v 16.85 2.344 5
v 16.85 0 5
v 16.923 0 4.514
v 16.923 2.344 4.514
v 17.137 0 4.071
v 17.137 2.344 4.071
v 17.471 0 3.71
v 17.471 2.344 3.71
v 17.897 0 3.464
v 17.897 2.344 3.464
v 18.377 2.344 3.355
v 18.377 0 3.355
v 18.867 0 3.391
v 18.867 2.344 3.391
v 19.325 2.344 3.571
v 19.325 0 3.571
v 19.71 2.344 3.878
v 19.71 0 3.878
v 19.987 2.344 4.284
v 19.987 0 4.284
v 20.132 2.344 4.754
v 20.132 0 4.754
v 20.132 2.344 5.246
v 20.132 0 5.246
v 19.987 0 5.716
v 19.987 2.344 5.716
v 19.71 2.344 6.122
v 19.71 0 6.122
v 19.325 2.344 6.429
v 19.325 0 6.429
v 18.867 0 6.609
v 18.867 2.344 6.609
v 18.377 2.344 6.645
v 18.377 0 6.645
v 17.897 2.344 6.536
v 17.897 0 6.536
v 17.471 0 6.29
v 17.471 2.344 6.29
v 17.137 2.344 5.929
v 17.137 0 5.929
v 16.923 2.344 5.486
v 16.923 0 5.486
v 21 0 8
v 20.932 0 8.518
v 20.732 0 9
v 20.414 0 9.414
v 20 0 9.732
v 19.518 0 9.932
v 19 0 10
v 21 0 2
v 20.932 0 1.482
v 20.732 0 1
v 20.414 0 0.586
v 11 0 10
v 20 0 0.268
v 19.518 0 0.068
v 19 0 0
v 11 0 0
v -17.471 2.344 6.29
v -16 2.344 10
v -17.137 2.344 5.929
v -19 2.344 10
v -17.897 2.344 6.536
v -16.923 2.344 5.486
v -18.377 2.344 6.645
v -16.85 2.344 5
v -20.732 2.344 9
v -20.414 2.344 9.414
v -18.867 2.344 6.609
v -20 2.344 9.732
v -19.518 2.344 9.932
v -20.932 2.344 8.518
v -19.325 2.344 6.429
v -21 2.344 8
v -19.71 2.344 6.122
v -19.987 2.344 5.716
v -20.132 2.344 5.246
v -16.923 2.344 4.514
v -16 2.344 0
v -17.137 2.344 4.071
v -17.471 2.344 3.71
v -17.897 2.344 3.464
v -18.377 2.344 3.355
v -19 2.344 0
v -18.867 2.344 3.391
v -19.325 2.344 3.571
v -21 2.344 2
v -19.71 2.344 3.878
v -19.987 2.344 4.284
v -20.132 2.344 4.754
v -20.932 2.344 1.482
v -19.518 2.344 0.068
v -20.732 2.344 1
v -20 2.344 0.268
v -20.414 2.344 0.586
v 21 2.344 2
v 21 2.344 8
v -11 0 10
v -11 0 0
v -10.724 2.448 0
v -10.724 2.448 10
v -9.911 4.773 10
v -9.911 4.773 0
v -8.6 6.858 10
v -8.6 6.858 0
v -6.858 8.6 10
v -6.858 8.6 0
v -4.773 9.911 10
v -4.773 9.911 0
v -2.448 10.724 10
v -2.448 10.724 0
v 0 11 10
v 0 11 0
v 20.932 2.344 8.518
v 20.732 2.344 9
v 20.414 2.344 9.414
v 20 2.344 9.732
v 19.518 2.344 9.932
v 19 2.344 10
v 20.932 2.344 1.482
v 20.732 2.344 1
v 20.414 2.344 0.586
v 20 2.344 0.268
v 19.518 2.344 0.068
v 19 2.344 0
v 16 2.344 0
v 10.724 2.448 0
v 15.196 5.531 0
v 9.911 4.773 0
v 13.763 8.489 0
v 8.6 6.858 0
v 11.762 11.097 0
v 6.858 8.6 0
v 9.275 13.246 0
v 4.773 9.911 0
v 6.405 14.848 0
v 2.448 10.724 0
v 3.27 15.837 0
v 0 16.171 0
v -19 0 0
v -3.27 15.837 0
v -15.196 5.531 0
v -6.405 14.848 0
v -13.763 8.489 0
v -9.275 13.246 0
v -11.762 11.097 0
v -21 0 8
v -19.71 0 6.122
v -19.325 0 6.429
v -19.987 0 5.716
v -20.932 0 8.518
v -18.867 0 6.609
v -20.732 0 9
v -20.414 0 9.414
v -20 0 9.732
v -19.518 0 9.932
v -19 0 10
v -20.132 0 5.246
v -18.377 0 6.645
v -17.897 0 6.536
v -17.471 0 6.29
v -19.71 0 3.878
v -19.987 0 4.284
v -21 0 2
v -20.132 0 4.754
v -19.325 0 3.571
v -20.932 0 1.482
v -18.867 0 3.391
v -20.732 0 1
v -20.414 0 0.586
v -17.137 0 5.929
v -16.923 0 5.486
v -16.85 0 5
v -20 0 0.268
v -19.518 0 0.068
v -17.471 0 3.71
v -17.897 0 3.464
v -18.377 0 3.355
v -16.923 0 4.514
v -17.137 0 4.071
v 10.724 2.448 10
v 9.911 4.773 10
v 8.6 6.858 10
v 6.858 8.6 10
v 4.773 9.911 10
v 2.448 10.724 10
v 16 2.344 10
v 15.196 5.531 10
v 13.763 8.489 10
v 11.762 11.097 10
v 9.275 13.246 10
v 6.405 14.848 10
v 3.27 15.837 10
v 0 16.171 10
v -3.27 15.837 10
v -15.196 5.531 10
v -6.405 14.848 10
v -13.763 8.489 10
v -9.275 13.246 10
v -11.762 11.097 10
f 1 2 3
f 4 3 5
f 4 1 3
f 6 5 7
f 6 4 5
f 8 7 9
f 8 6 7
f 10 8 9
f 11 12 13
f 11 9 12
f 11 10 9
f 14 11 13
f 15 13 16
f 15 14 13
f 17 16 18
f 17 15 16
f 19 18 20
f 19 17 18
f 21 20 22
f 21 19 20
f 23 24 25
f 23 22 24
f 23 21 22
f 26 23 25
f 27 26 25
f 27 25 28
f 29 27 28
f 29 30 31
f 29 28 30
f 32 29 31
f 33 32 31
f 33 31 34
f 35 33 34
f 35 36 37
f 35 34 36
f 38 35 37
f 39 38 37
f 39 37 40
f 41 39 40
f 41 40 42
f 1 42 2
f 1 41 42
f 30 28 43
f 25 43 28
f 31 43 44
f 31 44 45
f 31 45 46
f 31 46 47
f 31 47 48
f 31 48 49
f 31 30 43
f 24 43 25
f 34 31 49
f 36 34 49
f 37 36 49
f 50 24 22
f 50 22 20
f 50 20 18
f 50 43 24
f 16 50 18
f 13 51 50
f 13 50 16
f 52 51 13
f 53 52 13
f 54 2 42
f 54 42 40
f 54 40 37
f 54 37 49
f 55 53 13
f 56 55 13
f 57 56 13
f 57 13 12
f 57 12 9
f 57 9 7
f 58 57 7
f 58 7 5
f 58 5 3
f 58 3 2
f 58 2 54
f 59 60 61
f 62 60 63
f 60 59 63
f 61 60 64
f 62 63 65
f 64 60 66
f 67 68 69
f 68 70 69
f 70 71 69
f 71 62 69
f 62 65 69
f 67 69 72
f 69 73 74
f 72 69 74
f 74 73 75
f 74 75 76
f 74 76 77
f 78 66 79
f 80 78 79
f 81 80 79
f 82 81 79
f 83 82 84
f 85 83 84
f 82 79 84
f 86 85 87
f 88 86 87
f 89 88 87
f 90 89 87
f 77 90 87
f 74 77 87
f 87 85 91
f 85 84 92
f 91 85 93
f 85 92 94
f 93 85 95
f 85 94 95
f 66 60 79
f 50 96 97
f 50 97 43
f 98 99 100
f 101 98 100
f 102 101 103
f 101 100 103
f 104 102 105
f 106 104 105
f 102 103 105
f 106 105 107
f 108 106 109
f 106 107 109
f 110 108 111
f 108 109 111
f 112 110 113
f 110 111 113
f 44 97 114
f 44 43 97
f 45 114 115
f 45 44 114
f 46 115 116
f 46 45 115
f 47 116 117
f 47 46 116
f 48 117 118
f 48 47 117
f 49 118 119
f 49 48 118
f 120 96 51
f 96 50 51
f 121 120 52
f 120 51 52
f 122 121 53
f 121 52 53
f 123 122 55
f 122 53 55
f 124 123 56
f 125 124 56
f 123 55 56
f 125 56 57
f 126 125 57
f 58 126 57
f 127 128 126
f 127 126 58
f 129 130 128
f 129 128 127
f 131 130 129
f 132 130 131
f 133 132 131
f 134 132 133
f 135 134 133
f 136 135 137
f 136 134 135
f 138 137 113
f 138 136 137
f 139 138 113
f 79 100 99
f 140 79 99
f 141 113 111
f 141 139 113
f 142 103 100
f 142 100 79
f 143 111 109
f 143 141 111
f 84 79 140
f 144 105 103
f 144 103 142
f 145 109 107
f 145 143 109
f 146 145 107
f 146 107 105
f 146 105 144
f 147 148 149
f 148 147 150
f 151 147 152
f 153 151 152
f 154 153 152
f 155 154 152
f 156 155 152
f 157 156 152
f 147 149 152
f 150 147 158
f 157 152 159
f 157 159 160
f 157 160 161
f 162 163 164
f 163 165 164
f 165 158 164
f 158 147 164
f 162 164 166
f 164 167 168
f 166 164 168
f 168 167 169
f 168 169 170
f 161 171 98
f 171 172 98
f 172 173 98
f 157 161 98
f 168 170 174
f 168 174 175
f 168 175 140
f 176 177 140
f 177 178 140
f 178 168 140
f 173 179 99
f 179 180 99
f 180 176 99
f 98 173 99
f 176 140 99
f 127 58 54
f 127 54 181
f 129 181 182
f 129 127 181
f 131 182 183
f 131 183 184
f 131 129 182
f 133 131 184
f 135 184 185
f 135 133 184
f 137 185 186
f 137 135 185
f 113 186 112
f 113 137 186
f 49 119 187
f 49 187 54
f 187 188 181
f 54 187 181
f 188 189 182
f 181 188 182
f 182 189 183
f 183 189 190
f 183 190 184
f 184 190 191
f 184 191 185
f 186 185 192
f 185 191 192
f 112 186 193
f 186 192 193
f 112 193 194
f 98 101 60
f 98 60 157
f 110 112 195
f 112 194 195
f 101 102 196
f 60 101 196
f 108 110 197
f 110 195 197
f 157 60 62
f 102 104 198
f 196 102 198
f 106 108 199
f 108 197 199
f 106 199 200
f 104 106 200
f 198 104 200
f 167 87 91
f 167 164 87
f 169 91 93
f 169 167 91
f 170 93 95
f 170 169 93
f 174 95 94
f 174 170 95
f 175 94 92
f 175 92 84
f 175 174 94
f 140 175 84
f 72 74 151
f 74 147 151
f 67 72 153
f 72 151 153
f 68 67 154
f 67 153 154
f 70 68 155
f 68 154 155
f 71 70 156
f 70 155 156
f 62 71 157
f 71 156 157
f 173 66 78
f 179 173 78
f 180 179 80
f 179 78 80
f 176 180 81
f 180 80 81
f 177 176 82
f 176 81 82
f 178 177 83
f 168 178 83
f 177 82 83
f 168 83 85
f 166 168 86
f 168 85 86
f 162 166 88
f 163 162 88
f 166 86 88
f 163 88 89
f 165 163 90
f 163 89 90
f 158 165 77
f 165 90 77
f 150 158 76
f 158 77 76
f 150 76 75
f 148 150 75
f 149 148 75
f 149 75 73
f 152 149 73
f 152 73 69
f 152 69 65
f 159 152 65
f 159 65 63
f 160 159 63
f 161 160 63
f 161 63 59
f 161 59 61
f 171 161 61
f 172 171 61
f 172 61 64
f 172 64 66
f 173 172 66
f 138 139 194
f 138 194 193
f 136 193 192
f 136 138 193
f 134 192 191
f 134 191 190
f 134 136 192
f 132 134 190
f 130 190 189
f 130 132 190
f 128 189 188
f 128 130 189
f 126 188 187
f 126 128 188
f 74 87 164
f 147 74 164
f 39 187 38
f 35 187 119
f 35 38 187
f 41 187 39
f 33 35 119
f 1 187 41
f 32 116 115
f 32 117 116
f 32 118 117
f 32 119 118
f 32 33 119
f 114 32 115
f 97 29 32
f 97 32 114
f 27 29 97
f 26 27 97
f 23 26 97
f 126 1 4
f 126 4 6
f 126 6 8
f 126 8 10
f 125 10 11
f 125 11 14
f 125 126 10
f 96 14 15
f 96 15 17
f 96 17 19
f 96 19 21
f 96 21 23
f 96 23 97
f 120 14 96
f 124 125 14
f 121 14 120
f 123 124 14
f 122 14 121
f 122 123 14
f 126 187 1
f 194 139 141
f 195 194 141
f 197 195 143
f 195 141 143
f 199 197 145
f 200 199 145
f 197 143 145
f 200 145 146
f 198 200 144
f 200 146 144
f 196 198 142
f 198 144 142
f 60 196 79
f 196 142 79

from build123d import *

# Parameters (mm, degrees)
BOSS_EXTRUDE1_DEPTH  = 10
SKETCH2_R            = 1.65
CUT_EXTRUDE1_DEPTH   = 10
FILLET1_R            = 2
FILLET1_OF_MIRROR1_R = 2


with BuildPart() as part:
    # Sketch1 → Boss-Extrude1 (new body)
    with BuildSketch(Plane.XY):
        with BuildLine():
            Line((-21, 0), (-11, 0))
            ThreePointArc((-11, 0), (-7.778174593, 7.778174593), (0, 11))
            Line((0, 11), (0, 16.170747429))
            ThreePointArc((0, 16.170747429), (-10.573391114, 12.235050991), (-16, 2.343730447))
            Line((-16, 2.343730447), (-21, 2.343730447))
            Line((-21, 2.343730447), (-21, 0))
        make_face()
    boss_extrude1 = extrude(amount=BOSS_EXTRUDE1_DEPTH)

    # Sketch2 → Cut-Extrude1 (cut)
    with BuildSketch(Plane(origin=(0, 2.343730447, 0), x_dir=(1, 0, 0), z_dir=(0, 1, 0))):
        with Locations((-18.5, -5)):
            Circle(SKETCH2_R)
    cut_extrude1 = extrude(amount=-CUT_EXTRUDE1_DEPTH, mode=Mode.SUBTRACT)

    # Fillet1
    fillet1_edges = [part.edges().sort_by_distance(p)[0] for p in [
        (-21, 1.171865223, 10),
        (-21, 1.171865223, 0),
    ]]
    fillet(fillet1_edges, radius=FILLET1_R)

    # Mirror1: Boss-Extrude1, Cut-Extrude1 across plane
    add(boss_extrude1.mirror(Plane(origin=(0, 11, 10), x_dir=(0, 0, 1), z_dir=(-1, 0, 0))))
    add(cut_extrude1.mirror(Plane(origin=(0, 11, 10), x_dir=(0, 0, 1), z_dir=(-1, 0, 0))), mode=Mode.SUBTRACT)

    # Fillet1 of Mirror1
    fillet1_of_mirror1_edges = [part.edges().sort_by_distance(p)[0] for p in [
        (21, 1.171865223, 10),
        (21, 1.171865223, 0),
    ]]
    fillet(fillet1_of_mirror1_edges, radius=FILLET1_OF_MIRROR1_R)


solid = part.part
